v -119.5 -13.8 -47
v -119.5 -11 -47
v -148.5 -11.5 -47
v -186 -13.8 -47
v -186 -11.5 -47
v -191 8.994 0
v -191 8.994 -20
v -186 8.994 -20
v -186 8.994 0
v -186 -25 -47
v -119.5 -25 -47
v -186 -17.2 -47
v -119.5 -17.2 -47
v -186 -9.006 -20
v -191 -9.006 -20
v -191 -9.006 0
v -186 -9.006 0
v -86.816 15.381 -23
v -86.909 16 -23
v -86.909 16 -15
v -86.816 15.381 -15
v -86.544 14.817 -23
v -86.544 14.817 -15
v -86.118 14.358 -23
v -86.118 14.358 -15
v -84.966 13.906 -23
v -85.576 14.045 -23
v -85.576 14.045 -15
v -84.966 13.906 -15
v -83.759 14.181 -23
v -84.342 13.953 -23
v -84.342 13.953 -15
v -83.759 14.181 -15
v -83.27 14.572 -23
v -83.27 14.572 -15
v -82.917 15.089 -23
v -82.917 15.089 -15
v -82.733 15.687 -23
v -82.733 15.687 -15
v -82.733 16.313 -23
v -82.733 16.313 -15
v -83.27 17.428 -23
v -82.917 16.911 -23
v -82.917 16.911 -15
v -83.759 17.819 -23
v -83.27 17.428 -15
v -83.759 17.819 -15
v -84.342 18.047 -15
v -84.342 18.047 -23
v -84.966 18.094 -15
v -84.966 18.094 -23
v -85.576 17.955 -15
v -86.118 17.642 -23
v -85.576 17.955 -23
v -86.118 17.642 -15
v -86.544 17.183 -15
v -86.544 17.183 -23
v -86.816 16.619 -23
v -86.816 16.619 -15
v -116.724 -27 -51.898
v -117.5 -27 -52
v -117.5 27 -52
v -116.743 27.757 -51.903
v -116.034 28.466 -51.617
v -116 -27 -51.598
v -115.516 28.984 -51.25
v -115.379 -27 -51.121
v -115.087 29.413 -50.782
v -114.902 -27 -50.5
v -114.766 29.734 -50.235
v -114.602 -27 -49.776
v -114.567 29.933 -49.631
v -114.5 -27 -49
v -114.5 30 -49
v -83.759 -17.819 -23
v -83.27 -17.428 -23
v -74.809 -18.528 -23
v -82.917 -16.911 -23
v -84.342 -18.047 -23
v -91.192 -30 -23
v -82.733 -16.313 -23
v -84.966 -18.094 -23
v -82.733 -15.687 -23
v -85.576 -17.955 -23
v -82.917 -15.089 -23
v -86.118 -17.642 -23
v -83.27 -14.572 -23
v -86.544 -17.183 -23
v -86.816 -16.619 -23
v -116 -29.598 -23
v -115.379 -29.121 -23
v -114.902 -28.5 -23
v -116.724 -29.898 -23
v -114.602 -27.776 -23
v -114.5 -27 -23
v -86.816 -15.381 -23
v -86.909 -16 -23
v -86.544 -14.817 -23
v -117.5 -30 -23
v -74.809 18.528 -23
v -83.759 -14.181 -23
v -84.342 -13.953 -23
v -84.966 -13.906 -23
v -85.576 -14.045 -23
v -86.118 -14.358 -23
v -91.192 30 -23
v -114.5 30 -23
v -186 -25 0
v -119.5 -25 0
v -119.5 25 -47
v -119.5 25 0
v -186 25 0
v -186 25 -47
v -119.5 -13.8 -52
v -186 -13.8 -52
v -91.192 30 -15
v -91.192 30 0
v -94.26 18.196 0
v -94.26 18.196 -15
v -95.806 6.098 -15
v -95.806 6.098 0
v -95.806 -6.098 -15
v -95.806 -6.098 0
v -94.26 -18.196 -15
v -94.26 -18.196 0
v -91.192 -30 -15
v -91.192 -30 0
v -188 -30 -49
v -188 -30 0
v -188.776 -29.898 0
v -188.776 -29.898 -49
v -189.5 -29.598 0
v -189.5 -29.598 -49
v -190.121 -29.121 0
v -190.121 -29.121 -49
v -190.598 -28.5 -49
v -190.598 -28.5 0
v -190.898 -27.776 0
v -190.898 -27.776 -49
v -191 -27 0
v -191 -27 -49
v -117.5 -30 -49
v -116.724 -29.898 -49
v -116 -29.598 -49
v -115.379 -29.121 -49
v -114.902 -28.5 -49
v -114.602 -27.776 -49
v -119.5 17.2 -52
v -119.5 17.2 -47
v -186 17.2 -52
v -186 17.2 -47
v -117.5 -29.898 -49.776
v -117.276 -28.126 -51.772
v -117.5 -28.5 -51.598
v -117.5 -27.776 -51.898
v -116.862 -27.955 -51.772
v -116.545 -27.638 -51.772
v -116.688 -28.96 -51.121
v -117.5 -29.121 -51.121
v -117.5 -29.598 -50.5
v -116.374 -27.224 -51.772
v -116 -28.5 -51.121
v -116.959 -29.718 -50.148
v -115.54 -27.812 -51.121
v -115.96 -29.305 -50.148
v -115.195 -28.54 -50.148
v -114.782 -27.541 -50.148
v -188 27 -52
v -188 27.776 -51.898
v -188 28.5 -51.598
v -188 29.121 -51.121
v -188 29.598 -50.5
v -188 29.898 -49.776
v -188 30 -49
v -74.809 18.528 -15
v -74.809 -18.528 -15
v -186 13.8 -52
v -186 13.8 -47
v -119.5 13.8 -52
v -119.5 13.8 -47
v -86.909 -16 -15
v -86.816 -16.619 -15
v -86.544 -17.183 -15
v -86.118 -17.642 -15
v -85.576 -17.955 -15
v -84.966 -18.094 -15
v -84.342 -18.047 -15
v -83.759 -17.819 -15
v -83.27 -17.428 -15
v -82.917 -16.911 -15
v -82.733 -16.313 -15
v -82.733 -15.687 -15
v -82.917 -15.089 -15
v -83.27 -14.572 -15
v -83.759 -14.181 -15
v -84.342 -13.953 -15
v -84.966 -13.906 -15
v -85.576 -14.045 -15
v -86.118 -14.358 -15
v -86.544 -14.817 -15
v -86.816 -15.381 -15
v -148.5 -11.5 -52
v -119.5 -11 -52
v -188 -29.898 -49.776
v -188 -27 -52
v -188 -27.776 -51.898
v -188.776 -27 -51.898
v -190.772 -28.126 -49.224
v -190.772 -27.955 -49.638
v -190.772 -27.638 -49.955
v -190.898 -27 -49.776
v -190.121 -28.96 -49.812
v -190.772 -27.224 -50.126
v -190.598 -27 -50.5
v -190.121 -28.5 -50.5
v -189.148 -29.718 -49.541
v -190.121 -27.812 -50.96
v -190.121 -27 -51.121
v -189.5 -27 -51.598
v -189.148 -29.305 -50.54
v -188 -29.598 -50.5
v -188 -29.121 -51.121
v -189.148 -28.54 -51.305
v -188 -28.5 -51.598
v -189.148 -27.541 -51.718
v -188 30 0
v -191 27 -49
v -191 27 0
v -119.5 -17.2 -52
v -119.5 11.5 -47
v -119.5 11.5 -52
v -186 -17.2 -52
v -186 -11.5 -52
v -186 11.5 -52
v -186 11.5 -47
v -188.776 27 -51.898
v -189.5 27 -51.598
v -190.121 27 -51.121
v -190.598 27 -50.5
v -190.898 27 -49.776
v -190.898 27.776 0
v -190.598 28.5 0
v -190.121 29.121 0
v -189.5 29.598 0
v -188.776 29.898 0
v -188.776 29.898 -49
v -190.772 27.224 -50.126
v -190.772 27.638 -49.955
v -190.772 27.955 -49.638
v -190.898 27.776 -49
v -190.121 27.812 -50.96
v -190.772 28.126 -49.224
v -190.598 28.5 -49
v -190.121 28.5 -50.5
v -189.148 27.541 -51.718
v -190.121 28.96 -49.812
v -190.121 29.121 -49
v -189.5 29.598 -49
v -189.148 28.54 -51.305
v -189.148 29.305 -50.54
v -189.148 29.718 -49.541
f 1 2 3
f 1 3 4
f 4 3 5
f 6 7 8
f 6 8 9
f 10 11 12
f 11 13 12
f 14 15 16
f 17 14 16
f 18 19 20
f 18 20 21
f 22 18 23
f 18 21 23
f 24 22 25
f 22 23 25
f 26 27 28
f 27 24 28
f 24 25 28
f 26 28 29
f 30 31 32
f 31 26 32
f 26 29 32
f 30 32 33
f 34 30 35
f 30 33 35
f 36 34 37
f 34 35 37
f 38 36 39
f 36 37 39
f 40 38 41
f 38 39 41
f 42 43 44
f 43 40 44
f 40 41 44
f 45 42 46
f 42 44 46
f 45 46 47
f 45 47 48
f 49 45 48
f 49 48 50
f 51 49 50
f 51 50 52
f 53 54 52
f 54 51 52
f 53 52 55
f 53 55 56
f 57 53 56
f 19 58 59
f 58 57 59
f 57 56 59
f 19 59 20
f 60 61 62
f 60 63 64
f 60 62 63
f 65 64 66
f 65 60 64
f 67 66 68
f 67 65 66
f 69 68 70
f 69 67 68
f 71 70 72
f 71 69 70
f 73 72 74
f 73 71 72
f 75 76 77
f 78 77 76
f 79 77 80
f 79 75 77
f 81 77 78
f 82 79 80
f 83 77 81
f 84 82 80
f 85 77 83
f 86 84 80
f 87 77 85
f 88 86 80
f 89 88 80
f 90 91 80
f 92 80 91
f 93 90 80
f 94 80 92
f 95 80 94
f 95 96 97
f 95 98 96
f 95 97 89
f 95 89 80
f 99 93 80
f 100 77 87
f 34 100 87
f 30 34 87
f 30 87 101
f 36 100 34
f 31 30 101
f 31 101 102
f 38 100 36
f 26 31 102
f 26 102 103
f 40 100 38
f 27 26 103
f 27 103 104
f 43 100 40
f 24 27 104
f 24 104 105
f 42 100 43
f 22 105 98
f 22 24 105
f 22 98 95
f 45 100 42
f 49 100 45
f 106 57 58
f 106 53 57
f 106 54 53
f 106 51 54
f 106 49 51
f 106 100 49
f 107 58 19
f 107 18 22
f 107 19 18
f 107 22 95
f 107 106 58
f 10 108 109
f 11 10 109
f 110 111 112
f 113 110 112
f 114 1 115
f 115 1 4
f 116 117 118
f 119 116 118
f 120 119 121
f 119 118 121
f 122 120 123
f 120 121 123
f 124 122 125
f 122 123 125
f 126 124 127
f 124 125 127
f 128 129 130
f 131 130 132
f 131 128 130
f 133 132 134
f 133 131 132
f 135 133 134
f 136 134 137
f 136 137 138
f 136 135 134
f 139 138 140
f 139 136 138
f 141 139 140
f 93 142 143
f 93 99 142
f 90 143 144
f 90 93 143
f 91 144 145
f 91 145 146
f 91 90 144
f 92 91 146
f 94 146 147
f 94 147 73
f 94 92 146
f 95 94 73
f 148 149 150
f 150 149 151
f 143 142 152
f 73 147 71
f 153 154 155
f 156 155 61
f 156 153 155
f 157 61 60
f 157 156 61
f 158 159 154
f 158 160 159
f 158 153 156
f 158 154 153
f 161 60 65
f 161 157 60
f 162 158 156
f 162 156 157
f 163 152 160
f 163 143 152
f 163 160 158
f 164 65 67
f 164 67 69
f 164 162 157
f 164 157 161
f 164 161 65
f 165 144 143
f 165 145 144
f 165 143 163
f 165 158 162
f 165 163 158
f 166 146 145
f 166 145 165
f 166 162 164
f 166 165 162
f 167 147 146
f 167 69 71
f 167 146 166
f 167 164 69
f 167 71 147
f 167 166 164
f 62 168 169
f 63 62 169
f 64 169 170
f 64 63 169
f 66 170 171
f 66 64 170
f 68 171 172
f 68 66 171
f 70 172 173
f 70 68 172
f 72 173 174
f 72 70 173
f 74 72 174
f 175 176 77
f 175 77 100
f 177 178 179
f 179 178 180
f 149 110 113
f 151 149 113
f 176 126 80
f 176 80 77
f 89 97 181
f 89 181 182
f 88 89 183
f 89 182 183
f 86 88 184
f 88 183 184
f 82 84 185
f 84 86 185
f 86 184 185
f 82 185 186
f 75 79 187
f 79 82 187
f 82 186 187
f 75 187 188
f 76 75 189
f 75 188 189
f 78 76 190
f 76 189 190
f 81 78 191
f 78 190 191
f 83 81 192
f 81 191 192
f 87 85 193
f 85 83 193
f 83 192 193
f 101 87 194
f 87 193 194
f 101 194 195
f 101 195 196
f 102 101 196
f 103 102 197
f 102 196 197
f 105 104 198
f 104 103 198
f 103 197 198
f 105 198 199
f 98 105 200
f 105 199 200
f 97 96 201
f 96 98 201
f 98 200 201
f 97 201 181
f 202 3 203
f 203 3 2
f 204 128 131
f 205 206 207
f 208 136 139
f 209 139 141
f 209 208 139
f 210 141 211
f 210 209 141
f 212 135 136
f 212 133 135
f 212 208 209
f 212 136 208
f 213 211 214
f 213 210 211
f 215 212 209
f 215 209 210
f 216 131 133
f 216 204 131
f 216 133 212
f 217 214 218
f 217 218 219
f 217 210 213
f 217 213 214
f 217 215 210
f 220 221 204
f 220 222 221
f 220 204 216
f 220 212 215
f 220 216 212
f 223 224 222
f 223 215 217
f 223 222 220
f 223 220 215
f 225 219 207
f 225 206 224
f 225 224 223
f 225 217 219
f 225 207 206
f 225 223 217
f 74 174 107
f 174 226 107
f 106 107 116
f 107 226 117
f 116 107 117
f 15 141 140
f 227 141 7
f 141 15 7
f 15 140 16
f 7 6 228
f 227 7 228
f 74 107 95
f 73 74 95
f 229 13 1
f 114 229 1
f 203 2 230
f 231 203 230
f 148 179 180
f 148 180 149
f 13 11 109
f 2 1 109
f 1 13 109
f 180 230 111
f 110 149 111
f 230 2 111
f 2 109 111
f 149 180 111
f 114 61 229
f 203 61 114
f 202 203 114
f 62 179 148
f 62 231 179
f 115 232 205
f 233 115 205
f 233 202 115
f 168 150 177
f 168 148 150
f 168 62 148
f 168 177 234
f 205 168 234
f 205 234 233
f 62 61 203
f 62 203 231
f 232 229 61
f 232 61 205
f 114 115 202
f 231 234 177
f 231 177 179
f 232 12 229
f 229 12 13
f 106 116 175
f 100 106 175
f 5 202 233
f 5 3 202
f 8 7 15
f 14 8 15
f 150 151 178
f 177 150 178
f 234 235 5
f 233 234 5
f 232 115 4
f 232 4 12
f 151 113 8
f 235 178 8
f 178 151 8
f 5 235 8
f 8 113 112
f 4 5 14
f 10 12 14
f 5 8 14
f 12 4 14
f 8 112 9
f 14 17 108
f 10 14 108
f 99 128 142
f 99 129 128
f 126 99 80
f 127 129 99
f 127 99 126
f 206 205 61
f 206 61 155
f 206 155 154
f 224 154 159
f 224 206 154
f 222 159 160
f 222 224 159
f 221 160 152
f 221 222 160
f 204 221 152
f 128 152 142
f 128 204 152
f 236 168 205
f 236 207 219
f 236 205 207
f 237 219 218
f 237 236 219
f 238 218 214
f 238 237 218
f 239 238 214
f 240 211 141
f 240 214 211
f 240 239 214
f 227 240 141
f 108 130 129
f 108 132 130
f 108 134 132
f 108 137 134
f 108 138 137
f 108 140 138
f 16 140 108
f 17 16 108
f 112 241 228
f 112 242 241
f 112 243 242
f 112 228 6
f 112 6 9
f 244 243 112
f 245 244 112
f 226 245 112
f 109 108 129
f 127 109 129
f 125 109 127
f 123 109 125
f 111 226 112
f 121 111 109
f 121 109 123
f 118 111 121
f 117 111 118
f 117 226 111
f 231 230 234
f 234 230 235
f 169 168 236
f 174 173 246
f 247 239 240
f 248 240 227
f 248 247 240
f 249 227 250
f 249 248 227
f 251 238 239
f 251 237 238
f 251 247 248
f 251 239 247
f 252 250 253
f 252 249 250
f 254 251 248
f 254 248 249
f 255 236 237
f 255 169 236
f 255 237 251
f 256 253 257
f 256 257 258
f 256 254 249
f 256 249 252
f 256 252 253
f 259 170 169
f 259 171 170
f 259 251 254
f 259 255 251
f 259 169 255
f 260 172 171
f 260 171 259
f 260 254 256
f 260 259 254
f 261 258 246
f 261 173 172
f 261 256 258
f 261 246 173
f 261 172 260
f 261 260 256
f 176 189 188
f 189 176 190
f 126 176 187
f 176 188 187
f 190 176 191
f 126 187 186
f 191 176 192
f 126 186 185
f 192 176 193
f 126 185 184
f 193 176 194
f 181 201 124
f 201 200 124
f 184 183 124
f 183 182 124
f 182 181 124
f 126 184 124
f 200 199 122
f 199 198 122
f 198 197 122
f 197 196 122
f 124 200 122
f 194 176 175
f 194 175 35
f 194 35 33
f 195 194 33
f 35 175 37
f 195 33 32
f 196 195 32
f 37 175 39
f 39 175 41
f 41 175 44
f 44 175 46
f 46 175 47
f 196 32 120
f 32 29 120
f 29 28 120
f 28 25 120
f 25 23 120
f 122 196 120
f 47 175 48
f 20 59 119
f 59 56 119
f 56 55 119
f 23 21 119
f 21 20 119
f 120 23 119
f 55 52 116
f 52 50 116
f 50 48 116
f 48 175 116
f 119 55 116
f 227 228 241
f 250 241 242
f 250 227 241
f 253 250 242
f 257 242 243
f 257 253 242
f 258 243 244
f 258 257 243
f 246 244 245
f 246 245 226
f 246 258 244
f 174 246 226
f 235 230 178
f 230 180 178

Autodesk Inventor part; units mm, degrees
ref_plane "YZ Plane" through (0, 0, 0) normal (1, 0, 0) x (0, 1, 0)
ref_plane "XZ Plane" through (0, 0, 0) normal (0, 1, 0) x (-1, 0, 0)
ref_plane "Work Plane1" through (-132.9045, 0, 0) normal (0, 0, 1) x (1, 0, 0)
ref_plane "Work Plane2" through (-110.9217, -110.9217, -15) normal (0, 0, -1) x (0, 1, 0)
sketch "Sketch1" plane through (-132.9045, 0, 0) normal (0, 0, 1) x (1, 0, 0)
  arc A0 (116.9045, 94.6573) -> (116.9045, -94.6573) centre (132.9045, 0) ccw projected
  arc A1 (116.9045, -94.6573) -> (131.4538, -104) centre (131.4538, -88) ccw projected
  line L0 (131.4538, -104) -> (134.3553, -104) projected
  arc A2 (134.3553, -104) -> (148.9045, -94.6573) centre (134.3553, -88) ccw projected
  arc A3 (148.9045, -94.6573) -> (206.8801, -61.185) centre (132.9045, 0) ccw projected
  arc A4 (206.8801, -61.185) -> (222.2458, -53.2564) centre (208.3894, -45.2564) ccw projected
  line L1 (222.2458, -53.2564) -> (223.6965, -50.7436) projected
  arc A5 (223.6965, -50.7436) -> (222.8801, -33.4722) centre (209.8401, -42.7436) ccw projected
  arc A6 (222.8801, -33.4722) -> (222.8801, 33.4722) centre (132.9045, 0) ccw projected
  arc A7 (222.8801, 33.4722) -> (223.6965, 50.7436) centre (209.8401, 42.7436) ccw projected
  line L2 (223.6965, 50.7436) -> (222.2458, 53.2564) projected
  arc A8 (222.2458, 53.2564) -> (206.8801, 61.185) centre (208.3894, 45.2564) ccw projected
  arc A9 (206.8801, 61.185) -> (148.9045, 94.6573) centre (132.9045, 0) ccw projected
  arc A10 (148.9045, 94.6573) -> (134.3553, 104) centre (134.3553, 88) ccw projected
  line L3 (134.3553, 104) -> (131.4538, 104) projected
  arc A11 (131.4538, 104) -> (116.9045, 94.6573) centre (131.4538, 88) ccw projected
  circle A12 centre (132.9045, 0) radius 3.5 projected
  circle A13 centre (132.9045, -100) radius 3 projected
  circle A14 centre (63.6225, -40) radius 3.5 projected
  circle A15 centre (132.9045, -80) radius 3.5 projected
  circle A16 centre (202.1866, -40) radius 3.5 projected
  circle A17 centre (202.1866, 40) radius 3.5 projected
  circle A18 centre (132.9045, 80) radius 3.5 projected
  circle A19 centre (63.6225, 40) radius 3.5 projected
  circle A20 centre (219.5071, -50) radius 3 projected
  circle A21 centre (219.5071, 50) radius 3 projected
  circle A22 centre (132.9045, 100) radius 3 projected
  line L4 (36.9045, 0) -> (36.9045, 30)
  line L5 (36.9045, 30) -> (41.7124, 30)
  line L6 (36.9045, 0) -> (36.9045, -30)
  line L7 (36.9045, -30) -> (41.7124, -30)
  line L8 (36.9045, 30) -> (-58.0955, 30)
  line L9 (-58.0955, 30) -> (-58.0955, -30)
  line L10 (-58.0955, -30) -> (36.9045, -30)
  line L11 (36.9045, -30) -> (36.9045, 30)
  circle A23 centre (48.0955, -16) radius 2.1 projected
  circle A24 centre (48.0955, 16) radius 2.1 projected
  point P0 (132.9045, 0)
  dimension "d0" = 30
  dimension "d1" = 30
  dimension "d2" = 95
  dimension "d3" = 60
extrude "Extrusion1" add sketch "Sketch1" against normal up to surface (15 mm away) contours A0 L4 L5 | L6 L10 L9 L8 L4 | A0 L7 L6
sketch "Sketch2" plane through (-91.1921, 30, -15) normal (0, 0, -1) x (-1, 0, 0)
  circle A0 centre (-91.1921, -30) radius 3.5 projected
  arc A1 (-91.1921, 66) -> (-174.3305, 18) centre (-91.1921, -30) ccw projected
  circle A2 centre (-160.4741, 10) radius 16 projected
  arc A3 (-174.3305, 18) -> (-174.3305, -78) centre (-91.1921, -30) ccw projected
  circle A4 centre (-160.4741, -70) radius 16 projected
  arc A5 (-174.3305, -78) -> (-91.1921, -126) centre (-91.1921, -30) ccw projected
  circle A6 centre (-91.1921, -110) radius 16 projected
  arc A7 (-91.1921, -126) -> (-8.0537, -78) centre (-91.1921, -30) ccw projected
  circle A8 centre (-21.9101, -70) radius 16 projected
  arc A9 (-8.0537, -78) -> (-8.0537, 18) centre (-91.1921, -30) ccw projected
  circle A10 centre (-21.9101, 10) radius 16 projected
  arc A11 (-8.0537, 18) -> (-91.1921, 66) centre (-91.1921, -30) ccw projected
  circle A12 centre (-91.1921, 50) radius 16 projected
  line L0 (99.8079, 0) -> (99.8079, -60) projected
  line L1 (0, 0) -> (99.8079, 0) projected
  arc A13 (0, -60) -> (0, 0) centre (-91.1921, -30) ccw projected
  line L2 (99.8079, -60) -> (0, -60) projected
  circle A14 centre (-6.383, -14) radius 2.1
  line L3 (0, 0) -> (-16.383, -11.4715)
  line L4 (0, 0) -> (20, 0) construction
  line L5 (0, -60) -> (-16.383, -48.5285)
  line L6 (0, -60) -> (20, -60) construction
  line L7 (99.8079, -60) -> (0, -60) projected
  line L8 (-16.383, -48.5285) -> (-16.383, -11.4715)
  circle A15 centre (-6.383, -46) radius 2.1
  circle A16 centre (-6.383, -46) radius 2.1 projected
  circle A17 centre (-6.383, -14) radius 2.1 projected
  point P0 (-91.1921, -30)
  dimension "d6" = 4.2
  dimension "d7" = 14
  dimension "d8" = 20
  dimension "d9" = 145
  dimension "d10" = 20
  dimension "d11" = 145
  dimension "d12" = 10
  dimension "d13" = 14
  dimension "d14" = 10
extrude "Extrusion2" add sketch "Sketch2" along normal blind 8 contours L1 L0 L2 A9 | A9 L5 L8 L3
sketch "Sketch3" plane through (-91.1921, 30, -23) normal (0, 0, -1) x (-1, 0, 0)
  line L0 (38.3079, -51.5) -> (81.3079, -51.5)
  line L1 (81.3079, -51.5) -> (81.3079, -8.5)
  line L2 (81.3079, -8.5) -> (38.3079, -8.5)
  line L3 (38.3079, -8.5) -> (38.3079, -51.5)
  line L4 (38.3079, -51.5) -> (81.3079, -8.5) construction
  line L5 (81.3079, -51.5) -> (38.3079, -8.5) construction
  line L6 (99.8079, -60) -> (99.8079, 0) projected
  line L7 (99.8079, 0) -> (0, 0) projected
  line L8 (99.8079, -60) -> (0, -60) projected
  line L9 (99.8079, 0) -> (23.3079, 0)
  line L10 (23.3079, 0) -> (23.3079, -60)
  line L11 (23.3079, -60) -> (99.8079, -60)
  line L12 (99.8079, -60) -> (99.8079, 0)
  line L13 (28.3079, -55) -> (28.3079, -5)
  line L14 (28.3079, -5) -> (94.8079, -5)
  line L15 (94.8079, -5) -> (94.8079, -55)
  line L16 (94.8079, -55) -> (28.3079, -55)
  point P0 (-91.1921, -30)
  point P1 (59.8079, -30)
  point P2 (23.3079, 0)
  dimension "d17" = 43
  dimension "d18" = 43
  dimension "d26" = 30
  dimension "d29" = 40
  dimension "d30" = 15
  dimension "d31" = 5
extrude "Extrusion3" add sketch "Sketch3" along normal blind 24 contours L8 L10 L7 L6
sketch "Sketch4" plane through (-91.1921, 30, -47) normal (0, 0, -1) x (-1, 0, 0)
  circle A0 centre (41.8079, -14.5) radius 1.5 projected
  circle A1 centre (41.8079, -45.5) radius 1.5 projected
  circle A2 centre (72.8079, -14.5) radius 1.5 projected
  circle A3 centre (72.8079, -45.5) radius 1.5 projected
  circle A4 centre (57.3079, -30) radius 11 projected
  line L0 (76.3079, -9) -> (78.3079, -11) projected
  line L1 (76.3079, -9) -> (38.3079, -9) projected
  line L2 (36.3079, -11) -> (38.3079, -9) projected
  line L3 (36.3079, -11) -> (36.3079, -49) projected
  line L4 (38.3079, -51) -> (36.3079, -49) projected
  line L5 (38.3079, -51) -> (76.3079, -51) projected
  line L6 (78.3079, -49) -> (76.3079, -51) projected
  line L7 (78.3079, -49) -> (78.3079, -11) projected
  line L8 (23.3079, -60) -> (99.8079, -60) projected
  line L9 (99.8079, -60) -> (99.8079, 0) projected
  line L10 (99.8079, 0) -> (23.3079, 0) projected
  line L11 (23.3079, 0) -> (23.3079, -60) projected
  line L12 (28.3079, -55) -> (28.3079, -5) projected
  line L13 (28.3079, -5) -> (94.8079, -5) projected
  line L14 (94.8079, -5) -> (94.8079, -55) projected
  line L15 (94.8079, -55) -> (28.3079, -55) projected
  point P0 (-91.1921, -30)
extrude "Extrusion4" cut sketch "Sketch4" against normal through all contours A1 | A2 | A3 | A4
sketch "Sketch5" plane through (-91.1921, 30, -23) normal (0, 0, -1) x (-1, 0, 0)
  circle A0 centre (41.8079, -45.5) radius 1.5 projected
  circle A1 centre (57.3079, -30) radius 11 projected
  circle A2 centre (72.8079, -45.5) radius 1.5 projected
  circle A3 centre (72.8079, -14.5) radius 1.5 projected
  line L0 (28.3079, -55) -> (94.8079, -55) projected
  line L1 (94.8079, -55) -> (94.8079, -5) projected
  line L2 (94.8079, -5) -> (28.3079, -5) projected
  line L3 (28.3079, -5) -> (28.3079, -55) projected
  point P0 (-91.1921, -30)
extrude "Extrusion5" cut sketch "Sketch5" against normal through all
sketch "Sketch6" plane through (-91.1921, 30, -47) normal (0, 0, -1) x (-1, 0, 0)
  line L0 (23.3079, -60) -> (99.8079, -60) projected
  line L1 (99.8079, -60) -> (99.8079, 0) projected
  line L2 (99.8079, 0) -> (23.3079, 0) projected
  line L3 (23.3079, 0) -> (23.3079, -60) projected
  line L4 (28.3079, -55) -> (28.3079, -5) projected
  line L5 (28.3079, -5) -> (94.8079, -5) projected
  line L6 (94.8079, -5) -> (94.8079, -55) projected
  line L7 (94.8079, -55) -> (28.3079, -55) projected
  circle A0 centre (41.8079, -14.5) radius 1.5 projected
  circle A1 centre (72.8079, -14.5) radius 1.5 projected
  circle A2 centre (72.8079, -45.5) radius 1.5 projected
  circle A3 centre (41.8079, -45.5) radius 1.5 projected
  circle A4 centre (41.8079, -14.5) radius 1.7
  circle A5 centre (72.8079, -14.5) radius 1.7
  circle A6 centre (72.8079, -45.5) radius 1.7
  circle A7 centre (41.8079, -45.5) radius 1.7
  line L8 (41.8079, -43.8) -> (72.8079, -43.8)
  line L9 (72.8079, -47.2) -> (41.8079, -47.2)
  line L10 (41.8079, -12.8) -> (72.8079, -12.8)
  line L11 (72.8079, -16.2) -> (41.8079, -16.2)
  line L12 (41.8079, -16.2) -> (28.3079, -16.2)
  line L13 (41.8079, -12.8) -> (28.3079, -12.8)
  line L14 (72.8079, -12.8) -> (94.8079, -12.8)
  line L15 (72.8079, -16.2) -> (94.8079, -16.2)
  line L16 (72.8079, -43.8) -> (94.8079, -43.8)
  line L17 (72.8079, -47.2) -> (94.8079, -47.2)
  line L18 (41.8079, -47.2) -> (28.3079, -47.2)
  line L19 (41.8079, -43.8) -> (28.3079, -43.8)
  circle A8 centre (57.3079, -30) radius 11 projected
  circle A9 centre (57.3079, -30) radius 11.5
  line L20 (57.3079, -18.5) -> (28.3079, -18.5)
  line L21 (57.3079, -18.5) -> (94.8079, -18.5)
  line L22 (57.3079, -41.5) -> (94.8079, -41.5)
  line L23 (57.3079, -41.5) -> (28.3079, -41)
  point P0 (-91.1921, -30)
  point P1 (56.9115, -41.4932)
  dimension "d32" = 0.2
  dimension "d33" = 0.2
  dimension "d34" = 0.2
  dimension "d35" = 0.2
  dimension "d39" = 0.5
extrude "Extrusion6" add sketch "Sketch6" along normal blind 5 contours L3 L2 L1 L0 | L4 L18 L9 L17 L6 L7 | L4 L23 L22 L6 L16 L8 L19 | L4 L12 L11 L15 L6 L21 L20 | L4 L5 L6 L14 L10 L13
fillet "Fillet1" radius 3 7 edges at (-114.5, -30, -37.5) (-152.75, -30, -52) (-114.5, 0, -52) (-152.75, 30, -52) (-191, -30, -26) (-191, 0, -52) (-191, 30, -26)
sketch "Sketch7" plane through (-191, -27, 0) normal (-1, 0, 0) x (0, 0, 1)
  line L0 (0, 27) -> (-20, 27)
  line L1 (-20, 27) -> (-20, 17.9937)
  line L2 (-20, 17.9937) -> (0, 17.9937)
  line L3 (0, 17.9937) -> (0, 27)
  line L4 (0, 27) -> (-20, 27)
  line L5 (-20, 27) -> (-20, 35.9937)
  line L6 (-20, 35.9937) -> (0, 35.9937)
  line L7 (0, 35.9937) -> (0, 27)
  dimension "d41" = 20
  dimension "d42" = 18
extrude "Extrusion7" cut sketch "Sketch7" against normal up to surface (5 mm away)
properties part number "base-stepper-holder_3DPrint"
